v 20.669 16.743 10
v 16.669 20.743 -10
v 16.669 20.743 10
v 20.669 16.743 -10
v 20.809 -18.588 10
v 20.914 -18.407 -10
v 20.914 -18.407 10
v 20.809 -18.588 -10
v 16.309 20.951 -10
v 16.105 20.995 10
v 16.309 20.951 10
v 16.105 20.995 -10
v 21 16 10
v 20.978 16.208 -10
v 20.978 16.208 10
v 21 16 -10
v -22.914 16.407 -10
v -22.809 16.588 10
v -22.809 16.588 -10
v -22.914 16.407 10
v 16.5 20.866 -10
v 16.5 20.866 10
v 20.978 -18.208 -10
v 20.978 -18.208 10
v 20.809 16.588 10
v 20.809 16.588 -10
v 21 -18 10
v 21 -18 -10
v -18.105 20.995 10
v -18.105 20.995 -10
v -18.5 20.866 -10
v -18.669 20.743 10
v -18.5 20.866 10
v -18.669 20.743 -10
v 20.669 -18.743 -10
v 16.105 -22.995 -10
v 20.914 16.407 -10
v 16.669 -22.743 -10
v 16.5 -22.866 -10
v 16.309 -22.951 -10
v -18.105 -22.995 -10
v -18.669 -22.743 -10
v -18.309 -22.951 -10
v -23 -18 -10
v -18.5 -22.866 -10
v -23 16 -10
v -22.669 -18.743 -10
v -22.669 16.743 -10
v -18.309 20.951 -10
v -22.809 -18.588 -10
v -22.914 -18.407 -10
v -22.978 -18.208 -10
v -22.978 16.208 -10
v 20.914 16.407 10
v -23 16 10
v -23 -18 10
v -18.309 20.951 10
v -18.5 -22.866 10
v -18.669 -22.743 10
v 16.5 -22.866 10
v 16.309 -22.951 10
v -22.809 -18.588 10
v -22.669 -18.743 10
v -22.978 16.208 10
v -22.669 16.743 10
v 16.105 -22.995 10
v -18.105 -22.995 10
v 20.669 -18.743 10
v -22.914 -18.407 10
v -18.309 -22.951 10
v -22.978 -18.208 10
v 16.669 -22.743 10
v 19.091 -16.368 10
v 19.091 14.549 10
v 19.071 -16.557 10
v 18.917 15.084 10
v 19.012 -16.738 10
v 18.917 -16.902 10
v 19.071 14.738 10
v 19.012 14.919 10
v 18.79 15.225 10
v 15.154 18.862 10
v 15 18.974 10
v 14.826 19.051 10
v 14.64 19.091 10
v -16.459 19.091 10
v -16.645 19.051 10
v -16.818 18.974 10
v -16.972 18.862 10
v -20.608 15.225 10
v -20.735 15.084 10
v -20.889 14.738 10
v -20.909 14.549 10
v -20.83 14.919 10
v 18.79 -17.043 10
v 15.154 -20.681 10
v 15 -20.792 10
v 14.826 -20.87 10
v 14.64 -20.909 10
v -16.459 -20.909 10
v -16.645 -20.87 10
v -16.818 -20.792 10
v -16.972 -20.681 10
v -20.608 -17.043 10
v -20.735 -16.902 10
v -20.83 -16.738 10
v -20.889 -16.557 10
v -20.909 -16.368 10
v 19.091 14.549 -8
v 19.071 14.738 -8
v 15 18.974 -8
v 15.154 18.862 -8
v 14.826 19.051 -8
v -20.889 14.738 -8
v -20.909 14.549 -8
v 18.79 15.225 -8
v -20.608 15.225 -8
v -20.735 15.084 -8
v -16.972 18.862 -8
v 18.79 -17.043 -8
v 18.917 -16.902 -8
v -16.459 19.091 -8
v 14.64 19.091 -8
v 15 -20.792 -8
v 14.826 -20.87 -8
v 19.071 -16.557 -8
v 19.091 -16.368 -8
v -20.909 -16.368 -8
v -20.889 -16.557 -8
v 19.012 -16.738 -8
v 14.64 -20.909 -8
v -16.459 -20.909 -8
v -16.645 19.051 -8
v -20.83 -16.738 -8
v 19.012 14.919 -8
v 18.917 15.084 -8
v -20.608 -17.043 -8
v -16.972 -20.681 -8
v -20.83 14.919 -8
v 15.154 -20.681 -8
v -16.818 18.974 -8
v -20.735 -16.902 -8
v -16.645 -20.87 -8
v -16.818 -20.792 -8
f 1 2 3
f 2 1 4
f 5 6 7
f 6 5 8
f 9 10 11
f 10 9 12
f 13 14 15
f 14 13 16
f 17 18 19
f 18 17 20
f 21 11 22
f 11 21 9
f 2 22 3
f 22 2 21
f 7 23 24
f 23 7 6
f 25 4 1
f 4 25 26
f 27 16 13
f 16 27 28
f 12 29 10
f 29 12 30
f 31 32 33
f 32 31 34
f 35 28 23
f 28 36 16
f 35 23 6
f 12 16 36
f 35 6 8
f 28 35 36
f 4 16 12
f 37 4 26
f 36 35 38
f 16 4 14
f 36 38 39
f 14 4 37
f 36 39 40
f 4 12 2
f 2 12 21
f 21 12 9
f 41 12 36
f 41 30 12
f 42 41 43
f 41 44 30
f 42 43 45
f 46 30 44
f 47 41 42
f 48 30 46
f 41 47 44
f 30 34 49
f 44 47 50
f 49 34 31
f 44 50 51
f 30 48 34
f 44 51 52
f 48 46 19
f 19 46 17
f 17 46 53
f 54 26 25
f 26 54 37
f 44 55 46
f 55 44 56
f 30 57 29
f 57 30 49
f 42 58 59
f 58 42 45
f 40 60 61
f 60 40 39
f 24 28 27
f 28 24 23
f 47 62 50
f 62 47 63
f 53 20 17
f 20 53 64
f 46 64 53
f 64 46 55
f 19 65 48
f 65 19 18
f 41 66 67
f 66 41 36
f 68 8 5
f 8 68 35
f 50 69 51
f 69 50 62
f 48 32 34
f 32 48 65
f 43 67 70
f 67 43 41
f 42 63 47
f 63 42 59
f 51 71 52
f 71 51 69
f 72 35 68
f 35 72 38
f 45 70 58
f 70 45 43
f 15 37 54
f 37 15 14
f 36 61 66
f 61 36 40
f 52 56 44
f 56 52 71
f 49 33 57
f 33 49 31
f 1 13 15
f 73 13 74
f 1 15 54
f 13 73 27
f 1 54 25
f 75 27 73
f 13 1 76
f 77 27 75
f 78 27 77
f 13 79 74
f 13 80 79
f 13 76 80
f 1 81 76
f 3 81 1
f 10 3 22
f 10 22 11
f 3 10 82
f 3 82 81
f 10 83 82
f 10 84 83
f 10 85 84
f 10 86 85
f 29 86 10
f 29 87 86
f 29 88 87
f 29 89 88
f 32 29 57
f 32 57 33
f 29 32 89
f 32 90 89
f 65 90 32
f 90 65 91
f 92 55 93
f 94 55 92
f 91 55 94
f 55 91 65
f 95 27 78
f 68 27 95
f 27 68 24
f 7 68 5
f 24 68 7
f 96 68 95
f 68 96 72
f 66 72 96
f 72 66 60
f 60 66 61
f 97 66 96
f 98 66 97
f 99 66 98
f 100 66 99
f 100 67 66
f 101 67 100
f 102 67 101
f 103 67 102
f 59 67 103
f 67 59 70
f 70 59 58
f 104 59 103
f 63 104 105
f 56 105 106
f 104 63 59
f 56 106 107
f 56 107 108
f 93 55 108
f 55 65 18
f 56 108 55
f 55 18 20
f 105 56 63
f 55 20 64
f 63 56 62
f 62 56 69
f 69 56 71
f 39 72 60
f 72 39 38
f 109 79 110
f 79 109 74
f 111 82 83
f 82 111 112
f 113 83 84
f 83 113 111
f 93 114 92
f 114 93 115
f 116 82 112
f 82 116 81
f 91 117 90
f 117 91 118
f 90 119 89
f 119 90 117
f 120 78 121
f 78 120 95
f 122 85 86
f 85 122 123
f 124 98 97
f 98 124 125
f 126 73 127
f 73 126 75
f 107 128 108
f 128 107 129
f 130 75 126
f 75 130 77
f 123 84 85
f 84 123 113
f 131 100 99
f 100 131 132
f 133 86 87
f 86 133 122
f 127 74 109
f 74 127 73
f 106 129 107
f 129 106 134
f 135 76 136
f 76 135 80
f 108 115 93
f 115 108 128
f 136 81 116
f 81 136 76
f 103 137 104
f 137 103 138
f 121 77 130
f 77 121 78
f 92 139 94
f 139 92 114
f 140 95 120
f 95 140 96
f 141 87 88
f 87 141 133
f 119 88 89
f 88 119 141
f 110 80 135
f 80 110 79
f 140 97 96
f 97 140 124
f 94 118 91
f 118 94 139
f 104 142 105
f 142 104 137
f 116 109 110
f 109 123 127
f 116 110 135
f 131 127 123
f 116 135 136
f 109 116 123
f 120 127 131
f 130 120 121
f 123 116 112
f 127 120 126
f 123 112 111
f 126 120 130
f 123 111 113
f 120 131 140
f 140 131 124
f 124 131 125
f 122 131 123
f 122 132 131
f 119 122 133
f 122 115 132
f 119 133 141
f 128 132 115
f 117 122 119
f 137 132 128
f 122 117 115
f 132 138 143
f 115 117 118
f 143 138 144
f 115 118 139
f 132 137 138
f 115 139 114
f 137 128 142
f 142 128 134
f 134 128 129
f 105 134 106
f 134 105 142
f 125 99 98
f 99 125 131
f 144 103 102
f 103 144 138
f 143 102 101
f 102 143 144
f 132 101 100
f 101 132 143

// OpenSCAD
$fn = 30;


$wallThickness  = 2;

$heigth = 20;
$outterWith = 42;
$innerWith = 34;

$boltPatternWidth = 31;


$roundover = 2;

difference(){
	box();

	color("RED")
		translate([0,0,$wallThickness])
		resize([$outterWith-$wallThickness,$outterWith-$wallThickness,0]) box();
	}


module box(){

$roundover = 2;

	hull(){

		translate([ ($innerWith/2)-($roundover/2), ($outterWith/2)-($roundover/2),0]) cylinder(h=$heigth, d=$roundover, center=true);
		translate([-($innerWith/2)-($roundover/2), ($outterWith/2)-($roundover/2),0]) cylinder(h=$heigth, d=$roundover, center=true);
		translate([ ($innerWith/2)-($roundover/2),-($outterWith/2)-($roundover/2),0]) cylinder(h=$heigth, d=$roundover, center=true);
		translate([-($innerWith/2)-($roundover/2),-($outterWith/2)-($roundover/2),0]) cylinder(h=$heigth, d=$roundover, center=true);

		translate([ ($outterWith/2)-($roundover/2), ($innerWith/2)-($roundover/2),0]) cylinder(h=$heigth, d=$roundover, center=true);
		translate([-($outterWith/2)-($roundover/2), ($innerWith/2)-($roundover/2),0]) cylinder(h=$heigth, d=$roundover, center=true);
		translate([ ($outterWith/2)-($roundover/2),-($innerWith/2)-($roundover/2),0]) cylinder(h=$heigth, d=$roundover, center=true);
		translate([-($outterWith/2)-($roundover/2),-($innerWith/2)-($roundover/2),0]) cylinder(h=$heigth, d=$roundover, center=true);

	}

}
